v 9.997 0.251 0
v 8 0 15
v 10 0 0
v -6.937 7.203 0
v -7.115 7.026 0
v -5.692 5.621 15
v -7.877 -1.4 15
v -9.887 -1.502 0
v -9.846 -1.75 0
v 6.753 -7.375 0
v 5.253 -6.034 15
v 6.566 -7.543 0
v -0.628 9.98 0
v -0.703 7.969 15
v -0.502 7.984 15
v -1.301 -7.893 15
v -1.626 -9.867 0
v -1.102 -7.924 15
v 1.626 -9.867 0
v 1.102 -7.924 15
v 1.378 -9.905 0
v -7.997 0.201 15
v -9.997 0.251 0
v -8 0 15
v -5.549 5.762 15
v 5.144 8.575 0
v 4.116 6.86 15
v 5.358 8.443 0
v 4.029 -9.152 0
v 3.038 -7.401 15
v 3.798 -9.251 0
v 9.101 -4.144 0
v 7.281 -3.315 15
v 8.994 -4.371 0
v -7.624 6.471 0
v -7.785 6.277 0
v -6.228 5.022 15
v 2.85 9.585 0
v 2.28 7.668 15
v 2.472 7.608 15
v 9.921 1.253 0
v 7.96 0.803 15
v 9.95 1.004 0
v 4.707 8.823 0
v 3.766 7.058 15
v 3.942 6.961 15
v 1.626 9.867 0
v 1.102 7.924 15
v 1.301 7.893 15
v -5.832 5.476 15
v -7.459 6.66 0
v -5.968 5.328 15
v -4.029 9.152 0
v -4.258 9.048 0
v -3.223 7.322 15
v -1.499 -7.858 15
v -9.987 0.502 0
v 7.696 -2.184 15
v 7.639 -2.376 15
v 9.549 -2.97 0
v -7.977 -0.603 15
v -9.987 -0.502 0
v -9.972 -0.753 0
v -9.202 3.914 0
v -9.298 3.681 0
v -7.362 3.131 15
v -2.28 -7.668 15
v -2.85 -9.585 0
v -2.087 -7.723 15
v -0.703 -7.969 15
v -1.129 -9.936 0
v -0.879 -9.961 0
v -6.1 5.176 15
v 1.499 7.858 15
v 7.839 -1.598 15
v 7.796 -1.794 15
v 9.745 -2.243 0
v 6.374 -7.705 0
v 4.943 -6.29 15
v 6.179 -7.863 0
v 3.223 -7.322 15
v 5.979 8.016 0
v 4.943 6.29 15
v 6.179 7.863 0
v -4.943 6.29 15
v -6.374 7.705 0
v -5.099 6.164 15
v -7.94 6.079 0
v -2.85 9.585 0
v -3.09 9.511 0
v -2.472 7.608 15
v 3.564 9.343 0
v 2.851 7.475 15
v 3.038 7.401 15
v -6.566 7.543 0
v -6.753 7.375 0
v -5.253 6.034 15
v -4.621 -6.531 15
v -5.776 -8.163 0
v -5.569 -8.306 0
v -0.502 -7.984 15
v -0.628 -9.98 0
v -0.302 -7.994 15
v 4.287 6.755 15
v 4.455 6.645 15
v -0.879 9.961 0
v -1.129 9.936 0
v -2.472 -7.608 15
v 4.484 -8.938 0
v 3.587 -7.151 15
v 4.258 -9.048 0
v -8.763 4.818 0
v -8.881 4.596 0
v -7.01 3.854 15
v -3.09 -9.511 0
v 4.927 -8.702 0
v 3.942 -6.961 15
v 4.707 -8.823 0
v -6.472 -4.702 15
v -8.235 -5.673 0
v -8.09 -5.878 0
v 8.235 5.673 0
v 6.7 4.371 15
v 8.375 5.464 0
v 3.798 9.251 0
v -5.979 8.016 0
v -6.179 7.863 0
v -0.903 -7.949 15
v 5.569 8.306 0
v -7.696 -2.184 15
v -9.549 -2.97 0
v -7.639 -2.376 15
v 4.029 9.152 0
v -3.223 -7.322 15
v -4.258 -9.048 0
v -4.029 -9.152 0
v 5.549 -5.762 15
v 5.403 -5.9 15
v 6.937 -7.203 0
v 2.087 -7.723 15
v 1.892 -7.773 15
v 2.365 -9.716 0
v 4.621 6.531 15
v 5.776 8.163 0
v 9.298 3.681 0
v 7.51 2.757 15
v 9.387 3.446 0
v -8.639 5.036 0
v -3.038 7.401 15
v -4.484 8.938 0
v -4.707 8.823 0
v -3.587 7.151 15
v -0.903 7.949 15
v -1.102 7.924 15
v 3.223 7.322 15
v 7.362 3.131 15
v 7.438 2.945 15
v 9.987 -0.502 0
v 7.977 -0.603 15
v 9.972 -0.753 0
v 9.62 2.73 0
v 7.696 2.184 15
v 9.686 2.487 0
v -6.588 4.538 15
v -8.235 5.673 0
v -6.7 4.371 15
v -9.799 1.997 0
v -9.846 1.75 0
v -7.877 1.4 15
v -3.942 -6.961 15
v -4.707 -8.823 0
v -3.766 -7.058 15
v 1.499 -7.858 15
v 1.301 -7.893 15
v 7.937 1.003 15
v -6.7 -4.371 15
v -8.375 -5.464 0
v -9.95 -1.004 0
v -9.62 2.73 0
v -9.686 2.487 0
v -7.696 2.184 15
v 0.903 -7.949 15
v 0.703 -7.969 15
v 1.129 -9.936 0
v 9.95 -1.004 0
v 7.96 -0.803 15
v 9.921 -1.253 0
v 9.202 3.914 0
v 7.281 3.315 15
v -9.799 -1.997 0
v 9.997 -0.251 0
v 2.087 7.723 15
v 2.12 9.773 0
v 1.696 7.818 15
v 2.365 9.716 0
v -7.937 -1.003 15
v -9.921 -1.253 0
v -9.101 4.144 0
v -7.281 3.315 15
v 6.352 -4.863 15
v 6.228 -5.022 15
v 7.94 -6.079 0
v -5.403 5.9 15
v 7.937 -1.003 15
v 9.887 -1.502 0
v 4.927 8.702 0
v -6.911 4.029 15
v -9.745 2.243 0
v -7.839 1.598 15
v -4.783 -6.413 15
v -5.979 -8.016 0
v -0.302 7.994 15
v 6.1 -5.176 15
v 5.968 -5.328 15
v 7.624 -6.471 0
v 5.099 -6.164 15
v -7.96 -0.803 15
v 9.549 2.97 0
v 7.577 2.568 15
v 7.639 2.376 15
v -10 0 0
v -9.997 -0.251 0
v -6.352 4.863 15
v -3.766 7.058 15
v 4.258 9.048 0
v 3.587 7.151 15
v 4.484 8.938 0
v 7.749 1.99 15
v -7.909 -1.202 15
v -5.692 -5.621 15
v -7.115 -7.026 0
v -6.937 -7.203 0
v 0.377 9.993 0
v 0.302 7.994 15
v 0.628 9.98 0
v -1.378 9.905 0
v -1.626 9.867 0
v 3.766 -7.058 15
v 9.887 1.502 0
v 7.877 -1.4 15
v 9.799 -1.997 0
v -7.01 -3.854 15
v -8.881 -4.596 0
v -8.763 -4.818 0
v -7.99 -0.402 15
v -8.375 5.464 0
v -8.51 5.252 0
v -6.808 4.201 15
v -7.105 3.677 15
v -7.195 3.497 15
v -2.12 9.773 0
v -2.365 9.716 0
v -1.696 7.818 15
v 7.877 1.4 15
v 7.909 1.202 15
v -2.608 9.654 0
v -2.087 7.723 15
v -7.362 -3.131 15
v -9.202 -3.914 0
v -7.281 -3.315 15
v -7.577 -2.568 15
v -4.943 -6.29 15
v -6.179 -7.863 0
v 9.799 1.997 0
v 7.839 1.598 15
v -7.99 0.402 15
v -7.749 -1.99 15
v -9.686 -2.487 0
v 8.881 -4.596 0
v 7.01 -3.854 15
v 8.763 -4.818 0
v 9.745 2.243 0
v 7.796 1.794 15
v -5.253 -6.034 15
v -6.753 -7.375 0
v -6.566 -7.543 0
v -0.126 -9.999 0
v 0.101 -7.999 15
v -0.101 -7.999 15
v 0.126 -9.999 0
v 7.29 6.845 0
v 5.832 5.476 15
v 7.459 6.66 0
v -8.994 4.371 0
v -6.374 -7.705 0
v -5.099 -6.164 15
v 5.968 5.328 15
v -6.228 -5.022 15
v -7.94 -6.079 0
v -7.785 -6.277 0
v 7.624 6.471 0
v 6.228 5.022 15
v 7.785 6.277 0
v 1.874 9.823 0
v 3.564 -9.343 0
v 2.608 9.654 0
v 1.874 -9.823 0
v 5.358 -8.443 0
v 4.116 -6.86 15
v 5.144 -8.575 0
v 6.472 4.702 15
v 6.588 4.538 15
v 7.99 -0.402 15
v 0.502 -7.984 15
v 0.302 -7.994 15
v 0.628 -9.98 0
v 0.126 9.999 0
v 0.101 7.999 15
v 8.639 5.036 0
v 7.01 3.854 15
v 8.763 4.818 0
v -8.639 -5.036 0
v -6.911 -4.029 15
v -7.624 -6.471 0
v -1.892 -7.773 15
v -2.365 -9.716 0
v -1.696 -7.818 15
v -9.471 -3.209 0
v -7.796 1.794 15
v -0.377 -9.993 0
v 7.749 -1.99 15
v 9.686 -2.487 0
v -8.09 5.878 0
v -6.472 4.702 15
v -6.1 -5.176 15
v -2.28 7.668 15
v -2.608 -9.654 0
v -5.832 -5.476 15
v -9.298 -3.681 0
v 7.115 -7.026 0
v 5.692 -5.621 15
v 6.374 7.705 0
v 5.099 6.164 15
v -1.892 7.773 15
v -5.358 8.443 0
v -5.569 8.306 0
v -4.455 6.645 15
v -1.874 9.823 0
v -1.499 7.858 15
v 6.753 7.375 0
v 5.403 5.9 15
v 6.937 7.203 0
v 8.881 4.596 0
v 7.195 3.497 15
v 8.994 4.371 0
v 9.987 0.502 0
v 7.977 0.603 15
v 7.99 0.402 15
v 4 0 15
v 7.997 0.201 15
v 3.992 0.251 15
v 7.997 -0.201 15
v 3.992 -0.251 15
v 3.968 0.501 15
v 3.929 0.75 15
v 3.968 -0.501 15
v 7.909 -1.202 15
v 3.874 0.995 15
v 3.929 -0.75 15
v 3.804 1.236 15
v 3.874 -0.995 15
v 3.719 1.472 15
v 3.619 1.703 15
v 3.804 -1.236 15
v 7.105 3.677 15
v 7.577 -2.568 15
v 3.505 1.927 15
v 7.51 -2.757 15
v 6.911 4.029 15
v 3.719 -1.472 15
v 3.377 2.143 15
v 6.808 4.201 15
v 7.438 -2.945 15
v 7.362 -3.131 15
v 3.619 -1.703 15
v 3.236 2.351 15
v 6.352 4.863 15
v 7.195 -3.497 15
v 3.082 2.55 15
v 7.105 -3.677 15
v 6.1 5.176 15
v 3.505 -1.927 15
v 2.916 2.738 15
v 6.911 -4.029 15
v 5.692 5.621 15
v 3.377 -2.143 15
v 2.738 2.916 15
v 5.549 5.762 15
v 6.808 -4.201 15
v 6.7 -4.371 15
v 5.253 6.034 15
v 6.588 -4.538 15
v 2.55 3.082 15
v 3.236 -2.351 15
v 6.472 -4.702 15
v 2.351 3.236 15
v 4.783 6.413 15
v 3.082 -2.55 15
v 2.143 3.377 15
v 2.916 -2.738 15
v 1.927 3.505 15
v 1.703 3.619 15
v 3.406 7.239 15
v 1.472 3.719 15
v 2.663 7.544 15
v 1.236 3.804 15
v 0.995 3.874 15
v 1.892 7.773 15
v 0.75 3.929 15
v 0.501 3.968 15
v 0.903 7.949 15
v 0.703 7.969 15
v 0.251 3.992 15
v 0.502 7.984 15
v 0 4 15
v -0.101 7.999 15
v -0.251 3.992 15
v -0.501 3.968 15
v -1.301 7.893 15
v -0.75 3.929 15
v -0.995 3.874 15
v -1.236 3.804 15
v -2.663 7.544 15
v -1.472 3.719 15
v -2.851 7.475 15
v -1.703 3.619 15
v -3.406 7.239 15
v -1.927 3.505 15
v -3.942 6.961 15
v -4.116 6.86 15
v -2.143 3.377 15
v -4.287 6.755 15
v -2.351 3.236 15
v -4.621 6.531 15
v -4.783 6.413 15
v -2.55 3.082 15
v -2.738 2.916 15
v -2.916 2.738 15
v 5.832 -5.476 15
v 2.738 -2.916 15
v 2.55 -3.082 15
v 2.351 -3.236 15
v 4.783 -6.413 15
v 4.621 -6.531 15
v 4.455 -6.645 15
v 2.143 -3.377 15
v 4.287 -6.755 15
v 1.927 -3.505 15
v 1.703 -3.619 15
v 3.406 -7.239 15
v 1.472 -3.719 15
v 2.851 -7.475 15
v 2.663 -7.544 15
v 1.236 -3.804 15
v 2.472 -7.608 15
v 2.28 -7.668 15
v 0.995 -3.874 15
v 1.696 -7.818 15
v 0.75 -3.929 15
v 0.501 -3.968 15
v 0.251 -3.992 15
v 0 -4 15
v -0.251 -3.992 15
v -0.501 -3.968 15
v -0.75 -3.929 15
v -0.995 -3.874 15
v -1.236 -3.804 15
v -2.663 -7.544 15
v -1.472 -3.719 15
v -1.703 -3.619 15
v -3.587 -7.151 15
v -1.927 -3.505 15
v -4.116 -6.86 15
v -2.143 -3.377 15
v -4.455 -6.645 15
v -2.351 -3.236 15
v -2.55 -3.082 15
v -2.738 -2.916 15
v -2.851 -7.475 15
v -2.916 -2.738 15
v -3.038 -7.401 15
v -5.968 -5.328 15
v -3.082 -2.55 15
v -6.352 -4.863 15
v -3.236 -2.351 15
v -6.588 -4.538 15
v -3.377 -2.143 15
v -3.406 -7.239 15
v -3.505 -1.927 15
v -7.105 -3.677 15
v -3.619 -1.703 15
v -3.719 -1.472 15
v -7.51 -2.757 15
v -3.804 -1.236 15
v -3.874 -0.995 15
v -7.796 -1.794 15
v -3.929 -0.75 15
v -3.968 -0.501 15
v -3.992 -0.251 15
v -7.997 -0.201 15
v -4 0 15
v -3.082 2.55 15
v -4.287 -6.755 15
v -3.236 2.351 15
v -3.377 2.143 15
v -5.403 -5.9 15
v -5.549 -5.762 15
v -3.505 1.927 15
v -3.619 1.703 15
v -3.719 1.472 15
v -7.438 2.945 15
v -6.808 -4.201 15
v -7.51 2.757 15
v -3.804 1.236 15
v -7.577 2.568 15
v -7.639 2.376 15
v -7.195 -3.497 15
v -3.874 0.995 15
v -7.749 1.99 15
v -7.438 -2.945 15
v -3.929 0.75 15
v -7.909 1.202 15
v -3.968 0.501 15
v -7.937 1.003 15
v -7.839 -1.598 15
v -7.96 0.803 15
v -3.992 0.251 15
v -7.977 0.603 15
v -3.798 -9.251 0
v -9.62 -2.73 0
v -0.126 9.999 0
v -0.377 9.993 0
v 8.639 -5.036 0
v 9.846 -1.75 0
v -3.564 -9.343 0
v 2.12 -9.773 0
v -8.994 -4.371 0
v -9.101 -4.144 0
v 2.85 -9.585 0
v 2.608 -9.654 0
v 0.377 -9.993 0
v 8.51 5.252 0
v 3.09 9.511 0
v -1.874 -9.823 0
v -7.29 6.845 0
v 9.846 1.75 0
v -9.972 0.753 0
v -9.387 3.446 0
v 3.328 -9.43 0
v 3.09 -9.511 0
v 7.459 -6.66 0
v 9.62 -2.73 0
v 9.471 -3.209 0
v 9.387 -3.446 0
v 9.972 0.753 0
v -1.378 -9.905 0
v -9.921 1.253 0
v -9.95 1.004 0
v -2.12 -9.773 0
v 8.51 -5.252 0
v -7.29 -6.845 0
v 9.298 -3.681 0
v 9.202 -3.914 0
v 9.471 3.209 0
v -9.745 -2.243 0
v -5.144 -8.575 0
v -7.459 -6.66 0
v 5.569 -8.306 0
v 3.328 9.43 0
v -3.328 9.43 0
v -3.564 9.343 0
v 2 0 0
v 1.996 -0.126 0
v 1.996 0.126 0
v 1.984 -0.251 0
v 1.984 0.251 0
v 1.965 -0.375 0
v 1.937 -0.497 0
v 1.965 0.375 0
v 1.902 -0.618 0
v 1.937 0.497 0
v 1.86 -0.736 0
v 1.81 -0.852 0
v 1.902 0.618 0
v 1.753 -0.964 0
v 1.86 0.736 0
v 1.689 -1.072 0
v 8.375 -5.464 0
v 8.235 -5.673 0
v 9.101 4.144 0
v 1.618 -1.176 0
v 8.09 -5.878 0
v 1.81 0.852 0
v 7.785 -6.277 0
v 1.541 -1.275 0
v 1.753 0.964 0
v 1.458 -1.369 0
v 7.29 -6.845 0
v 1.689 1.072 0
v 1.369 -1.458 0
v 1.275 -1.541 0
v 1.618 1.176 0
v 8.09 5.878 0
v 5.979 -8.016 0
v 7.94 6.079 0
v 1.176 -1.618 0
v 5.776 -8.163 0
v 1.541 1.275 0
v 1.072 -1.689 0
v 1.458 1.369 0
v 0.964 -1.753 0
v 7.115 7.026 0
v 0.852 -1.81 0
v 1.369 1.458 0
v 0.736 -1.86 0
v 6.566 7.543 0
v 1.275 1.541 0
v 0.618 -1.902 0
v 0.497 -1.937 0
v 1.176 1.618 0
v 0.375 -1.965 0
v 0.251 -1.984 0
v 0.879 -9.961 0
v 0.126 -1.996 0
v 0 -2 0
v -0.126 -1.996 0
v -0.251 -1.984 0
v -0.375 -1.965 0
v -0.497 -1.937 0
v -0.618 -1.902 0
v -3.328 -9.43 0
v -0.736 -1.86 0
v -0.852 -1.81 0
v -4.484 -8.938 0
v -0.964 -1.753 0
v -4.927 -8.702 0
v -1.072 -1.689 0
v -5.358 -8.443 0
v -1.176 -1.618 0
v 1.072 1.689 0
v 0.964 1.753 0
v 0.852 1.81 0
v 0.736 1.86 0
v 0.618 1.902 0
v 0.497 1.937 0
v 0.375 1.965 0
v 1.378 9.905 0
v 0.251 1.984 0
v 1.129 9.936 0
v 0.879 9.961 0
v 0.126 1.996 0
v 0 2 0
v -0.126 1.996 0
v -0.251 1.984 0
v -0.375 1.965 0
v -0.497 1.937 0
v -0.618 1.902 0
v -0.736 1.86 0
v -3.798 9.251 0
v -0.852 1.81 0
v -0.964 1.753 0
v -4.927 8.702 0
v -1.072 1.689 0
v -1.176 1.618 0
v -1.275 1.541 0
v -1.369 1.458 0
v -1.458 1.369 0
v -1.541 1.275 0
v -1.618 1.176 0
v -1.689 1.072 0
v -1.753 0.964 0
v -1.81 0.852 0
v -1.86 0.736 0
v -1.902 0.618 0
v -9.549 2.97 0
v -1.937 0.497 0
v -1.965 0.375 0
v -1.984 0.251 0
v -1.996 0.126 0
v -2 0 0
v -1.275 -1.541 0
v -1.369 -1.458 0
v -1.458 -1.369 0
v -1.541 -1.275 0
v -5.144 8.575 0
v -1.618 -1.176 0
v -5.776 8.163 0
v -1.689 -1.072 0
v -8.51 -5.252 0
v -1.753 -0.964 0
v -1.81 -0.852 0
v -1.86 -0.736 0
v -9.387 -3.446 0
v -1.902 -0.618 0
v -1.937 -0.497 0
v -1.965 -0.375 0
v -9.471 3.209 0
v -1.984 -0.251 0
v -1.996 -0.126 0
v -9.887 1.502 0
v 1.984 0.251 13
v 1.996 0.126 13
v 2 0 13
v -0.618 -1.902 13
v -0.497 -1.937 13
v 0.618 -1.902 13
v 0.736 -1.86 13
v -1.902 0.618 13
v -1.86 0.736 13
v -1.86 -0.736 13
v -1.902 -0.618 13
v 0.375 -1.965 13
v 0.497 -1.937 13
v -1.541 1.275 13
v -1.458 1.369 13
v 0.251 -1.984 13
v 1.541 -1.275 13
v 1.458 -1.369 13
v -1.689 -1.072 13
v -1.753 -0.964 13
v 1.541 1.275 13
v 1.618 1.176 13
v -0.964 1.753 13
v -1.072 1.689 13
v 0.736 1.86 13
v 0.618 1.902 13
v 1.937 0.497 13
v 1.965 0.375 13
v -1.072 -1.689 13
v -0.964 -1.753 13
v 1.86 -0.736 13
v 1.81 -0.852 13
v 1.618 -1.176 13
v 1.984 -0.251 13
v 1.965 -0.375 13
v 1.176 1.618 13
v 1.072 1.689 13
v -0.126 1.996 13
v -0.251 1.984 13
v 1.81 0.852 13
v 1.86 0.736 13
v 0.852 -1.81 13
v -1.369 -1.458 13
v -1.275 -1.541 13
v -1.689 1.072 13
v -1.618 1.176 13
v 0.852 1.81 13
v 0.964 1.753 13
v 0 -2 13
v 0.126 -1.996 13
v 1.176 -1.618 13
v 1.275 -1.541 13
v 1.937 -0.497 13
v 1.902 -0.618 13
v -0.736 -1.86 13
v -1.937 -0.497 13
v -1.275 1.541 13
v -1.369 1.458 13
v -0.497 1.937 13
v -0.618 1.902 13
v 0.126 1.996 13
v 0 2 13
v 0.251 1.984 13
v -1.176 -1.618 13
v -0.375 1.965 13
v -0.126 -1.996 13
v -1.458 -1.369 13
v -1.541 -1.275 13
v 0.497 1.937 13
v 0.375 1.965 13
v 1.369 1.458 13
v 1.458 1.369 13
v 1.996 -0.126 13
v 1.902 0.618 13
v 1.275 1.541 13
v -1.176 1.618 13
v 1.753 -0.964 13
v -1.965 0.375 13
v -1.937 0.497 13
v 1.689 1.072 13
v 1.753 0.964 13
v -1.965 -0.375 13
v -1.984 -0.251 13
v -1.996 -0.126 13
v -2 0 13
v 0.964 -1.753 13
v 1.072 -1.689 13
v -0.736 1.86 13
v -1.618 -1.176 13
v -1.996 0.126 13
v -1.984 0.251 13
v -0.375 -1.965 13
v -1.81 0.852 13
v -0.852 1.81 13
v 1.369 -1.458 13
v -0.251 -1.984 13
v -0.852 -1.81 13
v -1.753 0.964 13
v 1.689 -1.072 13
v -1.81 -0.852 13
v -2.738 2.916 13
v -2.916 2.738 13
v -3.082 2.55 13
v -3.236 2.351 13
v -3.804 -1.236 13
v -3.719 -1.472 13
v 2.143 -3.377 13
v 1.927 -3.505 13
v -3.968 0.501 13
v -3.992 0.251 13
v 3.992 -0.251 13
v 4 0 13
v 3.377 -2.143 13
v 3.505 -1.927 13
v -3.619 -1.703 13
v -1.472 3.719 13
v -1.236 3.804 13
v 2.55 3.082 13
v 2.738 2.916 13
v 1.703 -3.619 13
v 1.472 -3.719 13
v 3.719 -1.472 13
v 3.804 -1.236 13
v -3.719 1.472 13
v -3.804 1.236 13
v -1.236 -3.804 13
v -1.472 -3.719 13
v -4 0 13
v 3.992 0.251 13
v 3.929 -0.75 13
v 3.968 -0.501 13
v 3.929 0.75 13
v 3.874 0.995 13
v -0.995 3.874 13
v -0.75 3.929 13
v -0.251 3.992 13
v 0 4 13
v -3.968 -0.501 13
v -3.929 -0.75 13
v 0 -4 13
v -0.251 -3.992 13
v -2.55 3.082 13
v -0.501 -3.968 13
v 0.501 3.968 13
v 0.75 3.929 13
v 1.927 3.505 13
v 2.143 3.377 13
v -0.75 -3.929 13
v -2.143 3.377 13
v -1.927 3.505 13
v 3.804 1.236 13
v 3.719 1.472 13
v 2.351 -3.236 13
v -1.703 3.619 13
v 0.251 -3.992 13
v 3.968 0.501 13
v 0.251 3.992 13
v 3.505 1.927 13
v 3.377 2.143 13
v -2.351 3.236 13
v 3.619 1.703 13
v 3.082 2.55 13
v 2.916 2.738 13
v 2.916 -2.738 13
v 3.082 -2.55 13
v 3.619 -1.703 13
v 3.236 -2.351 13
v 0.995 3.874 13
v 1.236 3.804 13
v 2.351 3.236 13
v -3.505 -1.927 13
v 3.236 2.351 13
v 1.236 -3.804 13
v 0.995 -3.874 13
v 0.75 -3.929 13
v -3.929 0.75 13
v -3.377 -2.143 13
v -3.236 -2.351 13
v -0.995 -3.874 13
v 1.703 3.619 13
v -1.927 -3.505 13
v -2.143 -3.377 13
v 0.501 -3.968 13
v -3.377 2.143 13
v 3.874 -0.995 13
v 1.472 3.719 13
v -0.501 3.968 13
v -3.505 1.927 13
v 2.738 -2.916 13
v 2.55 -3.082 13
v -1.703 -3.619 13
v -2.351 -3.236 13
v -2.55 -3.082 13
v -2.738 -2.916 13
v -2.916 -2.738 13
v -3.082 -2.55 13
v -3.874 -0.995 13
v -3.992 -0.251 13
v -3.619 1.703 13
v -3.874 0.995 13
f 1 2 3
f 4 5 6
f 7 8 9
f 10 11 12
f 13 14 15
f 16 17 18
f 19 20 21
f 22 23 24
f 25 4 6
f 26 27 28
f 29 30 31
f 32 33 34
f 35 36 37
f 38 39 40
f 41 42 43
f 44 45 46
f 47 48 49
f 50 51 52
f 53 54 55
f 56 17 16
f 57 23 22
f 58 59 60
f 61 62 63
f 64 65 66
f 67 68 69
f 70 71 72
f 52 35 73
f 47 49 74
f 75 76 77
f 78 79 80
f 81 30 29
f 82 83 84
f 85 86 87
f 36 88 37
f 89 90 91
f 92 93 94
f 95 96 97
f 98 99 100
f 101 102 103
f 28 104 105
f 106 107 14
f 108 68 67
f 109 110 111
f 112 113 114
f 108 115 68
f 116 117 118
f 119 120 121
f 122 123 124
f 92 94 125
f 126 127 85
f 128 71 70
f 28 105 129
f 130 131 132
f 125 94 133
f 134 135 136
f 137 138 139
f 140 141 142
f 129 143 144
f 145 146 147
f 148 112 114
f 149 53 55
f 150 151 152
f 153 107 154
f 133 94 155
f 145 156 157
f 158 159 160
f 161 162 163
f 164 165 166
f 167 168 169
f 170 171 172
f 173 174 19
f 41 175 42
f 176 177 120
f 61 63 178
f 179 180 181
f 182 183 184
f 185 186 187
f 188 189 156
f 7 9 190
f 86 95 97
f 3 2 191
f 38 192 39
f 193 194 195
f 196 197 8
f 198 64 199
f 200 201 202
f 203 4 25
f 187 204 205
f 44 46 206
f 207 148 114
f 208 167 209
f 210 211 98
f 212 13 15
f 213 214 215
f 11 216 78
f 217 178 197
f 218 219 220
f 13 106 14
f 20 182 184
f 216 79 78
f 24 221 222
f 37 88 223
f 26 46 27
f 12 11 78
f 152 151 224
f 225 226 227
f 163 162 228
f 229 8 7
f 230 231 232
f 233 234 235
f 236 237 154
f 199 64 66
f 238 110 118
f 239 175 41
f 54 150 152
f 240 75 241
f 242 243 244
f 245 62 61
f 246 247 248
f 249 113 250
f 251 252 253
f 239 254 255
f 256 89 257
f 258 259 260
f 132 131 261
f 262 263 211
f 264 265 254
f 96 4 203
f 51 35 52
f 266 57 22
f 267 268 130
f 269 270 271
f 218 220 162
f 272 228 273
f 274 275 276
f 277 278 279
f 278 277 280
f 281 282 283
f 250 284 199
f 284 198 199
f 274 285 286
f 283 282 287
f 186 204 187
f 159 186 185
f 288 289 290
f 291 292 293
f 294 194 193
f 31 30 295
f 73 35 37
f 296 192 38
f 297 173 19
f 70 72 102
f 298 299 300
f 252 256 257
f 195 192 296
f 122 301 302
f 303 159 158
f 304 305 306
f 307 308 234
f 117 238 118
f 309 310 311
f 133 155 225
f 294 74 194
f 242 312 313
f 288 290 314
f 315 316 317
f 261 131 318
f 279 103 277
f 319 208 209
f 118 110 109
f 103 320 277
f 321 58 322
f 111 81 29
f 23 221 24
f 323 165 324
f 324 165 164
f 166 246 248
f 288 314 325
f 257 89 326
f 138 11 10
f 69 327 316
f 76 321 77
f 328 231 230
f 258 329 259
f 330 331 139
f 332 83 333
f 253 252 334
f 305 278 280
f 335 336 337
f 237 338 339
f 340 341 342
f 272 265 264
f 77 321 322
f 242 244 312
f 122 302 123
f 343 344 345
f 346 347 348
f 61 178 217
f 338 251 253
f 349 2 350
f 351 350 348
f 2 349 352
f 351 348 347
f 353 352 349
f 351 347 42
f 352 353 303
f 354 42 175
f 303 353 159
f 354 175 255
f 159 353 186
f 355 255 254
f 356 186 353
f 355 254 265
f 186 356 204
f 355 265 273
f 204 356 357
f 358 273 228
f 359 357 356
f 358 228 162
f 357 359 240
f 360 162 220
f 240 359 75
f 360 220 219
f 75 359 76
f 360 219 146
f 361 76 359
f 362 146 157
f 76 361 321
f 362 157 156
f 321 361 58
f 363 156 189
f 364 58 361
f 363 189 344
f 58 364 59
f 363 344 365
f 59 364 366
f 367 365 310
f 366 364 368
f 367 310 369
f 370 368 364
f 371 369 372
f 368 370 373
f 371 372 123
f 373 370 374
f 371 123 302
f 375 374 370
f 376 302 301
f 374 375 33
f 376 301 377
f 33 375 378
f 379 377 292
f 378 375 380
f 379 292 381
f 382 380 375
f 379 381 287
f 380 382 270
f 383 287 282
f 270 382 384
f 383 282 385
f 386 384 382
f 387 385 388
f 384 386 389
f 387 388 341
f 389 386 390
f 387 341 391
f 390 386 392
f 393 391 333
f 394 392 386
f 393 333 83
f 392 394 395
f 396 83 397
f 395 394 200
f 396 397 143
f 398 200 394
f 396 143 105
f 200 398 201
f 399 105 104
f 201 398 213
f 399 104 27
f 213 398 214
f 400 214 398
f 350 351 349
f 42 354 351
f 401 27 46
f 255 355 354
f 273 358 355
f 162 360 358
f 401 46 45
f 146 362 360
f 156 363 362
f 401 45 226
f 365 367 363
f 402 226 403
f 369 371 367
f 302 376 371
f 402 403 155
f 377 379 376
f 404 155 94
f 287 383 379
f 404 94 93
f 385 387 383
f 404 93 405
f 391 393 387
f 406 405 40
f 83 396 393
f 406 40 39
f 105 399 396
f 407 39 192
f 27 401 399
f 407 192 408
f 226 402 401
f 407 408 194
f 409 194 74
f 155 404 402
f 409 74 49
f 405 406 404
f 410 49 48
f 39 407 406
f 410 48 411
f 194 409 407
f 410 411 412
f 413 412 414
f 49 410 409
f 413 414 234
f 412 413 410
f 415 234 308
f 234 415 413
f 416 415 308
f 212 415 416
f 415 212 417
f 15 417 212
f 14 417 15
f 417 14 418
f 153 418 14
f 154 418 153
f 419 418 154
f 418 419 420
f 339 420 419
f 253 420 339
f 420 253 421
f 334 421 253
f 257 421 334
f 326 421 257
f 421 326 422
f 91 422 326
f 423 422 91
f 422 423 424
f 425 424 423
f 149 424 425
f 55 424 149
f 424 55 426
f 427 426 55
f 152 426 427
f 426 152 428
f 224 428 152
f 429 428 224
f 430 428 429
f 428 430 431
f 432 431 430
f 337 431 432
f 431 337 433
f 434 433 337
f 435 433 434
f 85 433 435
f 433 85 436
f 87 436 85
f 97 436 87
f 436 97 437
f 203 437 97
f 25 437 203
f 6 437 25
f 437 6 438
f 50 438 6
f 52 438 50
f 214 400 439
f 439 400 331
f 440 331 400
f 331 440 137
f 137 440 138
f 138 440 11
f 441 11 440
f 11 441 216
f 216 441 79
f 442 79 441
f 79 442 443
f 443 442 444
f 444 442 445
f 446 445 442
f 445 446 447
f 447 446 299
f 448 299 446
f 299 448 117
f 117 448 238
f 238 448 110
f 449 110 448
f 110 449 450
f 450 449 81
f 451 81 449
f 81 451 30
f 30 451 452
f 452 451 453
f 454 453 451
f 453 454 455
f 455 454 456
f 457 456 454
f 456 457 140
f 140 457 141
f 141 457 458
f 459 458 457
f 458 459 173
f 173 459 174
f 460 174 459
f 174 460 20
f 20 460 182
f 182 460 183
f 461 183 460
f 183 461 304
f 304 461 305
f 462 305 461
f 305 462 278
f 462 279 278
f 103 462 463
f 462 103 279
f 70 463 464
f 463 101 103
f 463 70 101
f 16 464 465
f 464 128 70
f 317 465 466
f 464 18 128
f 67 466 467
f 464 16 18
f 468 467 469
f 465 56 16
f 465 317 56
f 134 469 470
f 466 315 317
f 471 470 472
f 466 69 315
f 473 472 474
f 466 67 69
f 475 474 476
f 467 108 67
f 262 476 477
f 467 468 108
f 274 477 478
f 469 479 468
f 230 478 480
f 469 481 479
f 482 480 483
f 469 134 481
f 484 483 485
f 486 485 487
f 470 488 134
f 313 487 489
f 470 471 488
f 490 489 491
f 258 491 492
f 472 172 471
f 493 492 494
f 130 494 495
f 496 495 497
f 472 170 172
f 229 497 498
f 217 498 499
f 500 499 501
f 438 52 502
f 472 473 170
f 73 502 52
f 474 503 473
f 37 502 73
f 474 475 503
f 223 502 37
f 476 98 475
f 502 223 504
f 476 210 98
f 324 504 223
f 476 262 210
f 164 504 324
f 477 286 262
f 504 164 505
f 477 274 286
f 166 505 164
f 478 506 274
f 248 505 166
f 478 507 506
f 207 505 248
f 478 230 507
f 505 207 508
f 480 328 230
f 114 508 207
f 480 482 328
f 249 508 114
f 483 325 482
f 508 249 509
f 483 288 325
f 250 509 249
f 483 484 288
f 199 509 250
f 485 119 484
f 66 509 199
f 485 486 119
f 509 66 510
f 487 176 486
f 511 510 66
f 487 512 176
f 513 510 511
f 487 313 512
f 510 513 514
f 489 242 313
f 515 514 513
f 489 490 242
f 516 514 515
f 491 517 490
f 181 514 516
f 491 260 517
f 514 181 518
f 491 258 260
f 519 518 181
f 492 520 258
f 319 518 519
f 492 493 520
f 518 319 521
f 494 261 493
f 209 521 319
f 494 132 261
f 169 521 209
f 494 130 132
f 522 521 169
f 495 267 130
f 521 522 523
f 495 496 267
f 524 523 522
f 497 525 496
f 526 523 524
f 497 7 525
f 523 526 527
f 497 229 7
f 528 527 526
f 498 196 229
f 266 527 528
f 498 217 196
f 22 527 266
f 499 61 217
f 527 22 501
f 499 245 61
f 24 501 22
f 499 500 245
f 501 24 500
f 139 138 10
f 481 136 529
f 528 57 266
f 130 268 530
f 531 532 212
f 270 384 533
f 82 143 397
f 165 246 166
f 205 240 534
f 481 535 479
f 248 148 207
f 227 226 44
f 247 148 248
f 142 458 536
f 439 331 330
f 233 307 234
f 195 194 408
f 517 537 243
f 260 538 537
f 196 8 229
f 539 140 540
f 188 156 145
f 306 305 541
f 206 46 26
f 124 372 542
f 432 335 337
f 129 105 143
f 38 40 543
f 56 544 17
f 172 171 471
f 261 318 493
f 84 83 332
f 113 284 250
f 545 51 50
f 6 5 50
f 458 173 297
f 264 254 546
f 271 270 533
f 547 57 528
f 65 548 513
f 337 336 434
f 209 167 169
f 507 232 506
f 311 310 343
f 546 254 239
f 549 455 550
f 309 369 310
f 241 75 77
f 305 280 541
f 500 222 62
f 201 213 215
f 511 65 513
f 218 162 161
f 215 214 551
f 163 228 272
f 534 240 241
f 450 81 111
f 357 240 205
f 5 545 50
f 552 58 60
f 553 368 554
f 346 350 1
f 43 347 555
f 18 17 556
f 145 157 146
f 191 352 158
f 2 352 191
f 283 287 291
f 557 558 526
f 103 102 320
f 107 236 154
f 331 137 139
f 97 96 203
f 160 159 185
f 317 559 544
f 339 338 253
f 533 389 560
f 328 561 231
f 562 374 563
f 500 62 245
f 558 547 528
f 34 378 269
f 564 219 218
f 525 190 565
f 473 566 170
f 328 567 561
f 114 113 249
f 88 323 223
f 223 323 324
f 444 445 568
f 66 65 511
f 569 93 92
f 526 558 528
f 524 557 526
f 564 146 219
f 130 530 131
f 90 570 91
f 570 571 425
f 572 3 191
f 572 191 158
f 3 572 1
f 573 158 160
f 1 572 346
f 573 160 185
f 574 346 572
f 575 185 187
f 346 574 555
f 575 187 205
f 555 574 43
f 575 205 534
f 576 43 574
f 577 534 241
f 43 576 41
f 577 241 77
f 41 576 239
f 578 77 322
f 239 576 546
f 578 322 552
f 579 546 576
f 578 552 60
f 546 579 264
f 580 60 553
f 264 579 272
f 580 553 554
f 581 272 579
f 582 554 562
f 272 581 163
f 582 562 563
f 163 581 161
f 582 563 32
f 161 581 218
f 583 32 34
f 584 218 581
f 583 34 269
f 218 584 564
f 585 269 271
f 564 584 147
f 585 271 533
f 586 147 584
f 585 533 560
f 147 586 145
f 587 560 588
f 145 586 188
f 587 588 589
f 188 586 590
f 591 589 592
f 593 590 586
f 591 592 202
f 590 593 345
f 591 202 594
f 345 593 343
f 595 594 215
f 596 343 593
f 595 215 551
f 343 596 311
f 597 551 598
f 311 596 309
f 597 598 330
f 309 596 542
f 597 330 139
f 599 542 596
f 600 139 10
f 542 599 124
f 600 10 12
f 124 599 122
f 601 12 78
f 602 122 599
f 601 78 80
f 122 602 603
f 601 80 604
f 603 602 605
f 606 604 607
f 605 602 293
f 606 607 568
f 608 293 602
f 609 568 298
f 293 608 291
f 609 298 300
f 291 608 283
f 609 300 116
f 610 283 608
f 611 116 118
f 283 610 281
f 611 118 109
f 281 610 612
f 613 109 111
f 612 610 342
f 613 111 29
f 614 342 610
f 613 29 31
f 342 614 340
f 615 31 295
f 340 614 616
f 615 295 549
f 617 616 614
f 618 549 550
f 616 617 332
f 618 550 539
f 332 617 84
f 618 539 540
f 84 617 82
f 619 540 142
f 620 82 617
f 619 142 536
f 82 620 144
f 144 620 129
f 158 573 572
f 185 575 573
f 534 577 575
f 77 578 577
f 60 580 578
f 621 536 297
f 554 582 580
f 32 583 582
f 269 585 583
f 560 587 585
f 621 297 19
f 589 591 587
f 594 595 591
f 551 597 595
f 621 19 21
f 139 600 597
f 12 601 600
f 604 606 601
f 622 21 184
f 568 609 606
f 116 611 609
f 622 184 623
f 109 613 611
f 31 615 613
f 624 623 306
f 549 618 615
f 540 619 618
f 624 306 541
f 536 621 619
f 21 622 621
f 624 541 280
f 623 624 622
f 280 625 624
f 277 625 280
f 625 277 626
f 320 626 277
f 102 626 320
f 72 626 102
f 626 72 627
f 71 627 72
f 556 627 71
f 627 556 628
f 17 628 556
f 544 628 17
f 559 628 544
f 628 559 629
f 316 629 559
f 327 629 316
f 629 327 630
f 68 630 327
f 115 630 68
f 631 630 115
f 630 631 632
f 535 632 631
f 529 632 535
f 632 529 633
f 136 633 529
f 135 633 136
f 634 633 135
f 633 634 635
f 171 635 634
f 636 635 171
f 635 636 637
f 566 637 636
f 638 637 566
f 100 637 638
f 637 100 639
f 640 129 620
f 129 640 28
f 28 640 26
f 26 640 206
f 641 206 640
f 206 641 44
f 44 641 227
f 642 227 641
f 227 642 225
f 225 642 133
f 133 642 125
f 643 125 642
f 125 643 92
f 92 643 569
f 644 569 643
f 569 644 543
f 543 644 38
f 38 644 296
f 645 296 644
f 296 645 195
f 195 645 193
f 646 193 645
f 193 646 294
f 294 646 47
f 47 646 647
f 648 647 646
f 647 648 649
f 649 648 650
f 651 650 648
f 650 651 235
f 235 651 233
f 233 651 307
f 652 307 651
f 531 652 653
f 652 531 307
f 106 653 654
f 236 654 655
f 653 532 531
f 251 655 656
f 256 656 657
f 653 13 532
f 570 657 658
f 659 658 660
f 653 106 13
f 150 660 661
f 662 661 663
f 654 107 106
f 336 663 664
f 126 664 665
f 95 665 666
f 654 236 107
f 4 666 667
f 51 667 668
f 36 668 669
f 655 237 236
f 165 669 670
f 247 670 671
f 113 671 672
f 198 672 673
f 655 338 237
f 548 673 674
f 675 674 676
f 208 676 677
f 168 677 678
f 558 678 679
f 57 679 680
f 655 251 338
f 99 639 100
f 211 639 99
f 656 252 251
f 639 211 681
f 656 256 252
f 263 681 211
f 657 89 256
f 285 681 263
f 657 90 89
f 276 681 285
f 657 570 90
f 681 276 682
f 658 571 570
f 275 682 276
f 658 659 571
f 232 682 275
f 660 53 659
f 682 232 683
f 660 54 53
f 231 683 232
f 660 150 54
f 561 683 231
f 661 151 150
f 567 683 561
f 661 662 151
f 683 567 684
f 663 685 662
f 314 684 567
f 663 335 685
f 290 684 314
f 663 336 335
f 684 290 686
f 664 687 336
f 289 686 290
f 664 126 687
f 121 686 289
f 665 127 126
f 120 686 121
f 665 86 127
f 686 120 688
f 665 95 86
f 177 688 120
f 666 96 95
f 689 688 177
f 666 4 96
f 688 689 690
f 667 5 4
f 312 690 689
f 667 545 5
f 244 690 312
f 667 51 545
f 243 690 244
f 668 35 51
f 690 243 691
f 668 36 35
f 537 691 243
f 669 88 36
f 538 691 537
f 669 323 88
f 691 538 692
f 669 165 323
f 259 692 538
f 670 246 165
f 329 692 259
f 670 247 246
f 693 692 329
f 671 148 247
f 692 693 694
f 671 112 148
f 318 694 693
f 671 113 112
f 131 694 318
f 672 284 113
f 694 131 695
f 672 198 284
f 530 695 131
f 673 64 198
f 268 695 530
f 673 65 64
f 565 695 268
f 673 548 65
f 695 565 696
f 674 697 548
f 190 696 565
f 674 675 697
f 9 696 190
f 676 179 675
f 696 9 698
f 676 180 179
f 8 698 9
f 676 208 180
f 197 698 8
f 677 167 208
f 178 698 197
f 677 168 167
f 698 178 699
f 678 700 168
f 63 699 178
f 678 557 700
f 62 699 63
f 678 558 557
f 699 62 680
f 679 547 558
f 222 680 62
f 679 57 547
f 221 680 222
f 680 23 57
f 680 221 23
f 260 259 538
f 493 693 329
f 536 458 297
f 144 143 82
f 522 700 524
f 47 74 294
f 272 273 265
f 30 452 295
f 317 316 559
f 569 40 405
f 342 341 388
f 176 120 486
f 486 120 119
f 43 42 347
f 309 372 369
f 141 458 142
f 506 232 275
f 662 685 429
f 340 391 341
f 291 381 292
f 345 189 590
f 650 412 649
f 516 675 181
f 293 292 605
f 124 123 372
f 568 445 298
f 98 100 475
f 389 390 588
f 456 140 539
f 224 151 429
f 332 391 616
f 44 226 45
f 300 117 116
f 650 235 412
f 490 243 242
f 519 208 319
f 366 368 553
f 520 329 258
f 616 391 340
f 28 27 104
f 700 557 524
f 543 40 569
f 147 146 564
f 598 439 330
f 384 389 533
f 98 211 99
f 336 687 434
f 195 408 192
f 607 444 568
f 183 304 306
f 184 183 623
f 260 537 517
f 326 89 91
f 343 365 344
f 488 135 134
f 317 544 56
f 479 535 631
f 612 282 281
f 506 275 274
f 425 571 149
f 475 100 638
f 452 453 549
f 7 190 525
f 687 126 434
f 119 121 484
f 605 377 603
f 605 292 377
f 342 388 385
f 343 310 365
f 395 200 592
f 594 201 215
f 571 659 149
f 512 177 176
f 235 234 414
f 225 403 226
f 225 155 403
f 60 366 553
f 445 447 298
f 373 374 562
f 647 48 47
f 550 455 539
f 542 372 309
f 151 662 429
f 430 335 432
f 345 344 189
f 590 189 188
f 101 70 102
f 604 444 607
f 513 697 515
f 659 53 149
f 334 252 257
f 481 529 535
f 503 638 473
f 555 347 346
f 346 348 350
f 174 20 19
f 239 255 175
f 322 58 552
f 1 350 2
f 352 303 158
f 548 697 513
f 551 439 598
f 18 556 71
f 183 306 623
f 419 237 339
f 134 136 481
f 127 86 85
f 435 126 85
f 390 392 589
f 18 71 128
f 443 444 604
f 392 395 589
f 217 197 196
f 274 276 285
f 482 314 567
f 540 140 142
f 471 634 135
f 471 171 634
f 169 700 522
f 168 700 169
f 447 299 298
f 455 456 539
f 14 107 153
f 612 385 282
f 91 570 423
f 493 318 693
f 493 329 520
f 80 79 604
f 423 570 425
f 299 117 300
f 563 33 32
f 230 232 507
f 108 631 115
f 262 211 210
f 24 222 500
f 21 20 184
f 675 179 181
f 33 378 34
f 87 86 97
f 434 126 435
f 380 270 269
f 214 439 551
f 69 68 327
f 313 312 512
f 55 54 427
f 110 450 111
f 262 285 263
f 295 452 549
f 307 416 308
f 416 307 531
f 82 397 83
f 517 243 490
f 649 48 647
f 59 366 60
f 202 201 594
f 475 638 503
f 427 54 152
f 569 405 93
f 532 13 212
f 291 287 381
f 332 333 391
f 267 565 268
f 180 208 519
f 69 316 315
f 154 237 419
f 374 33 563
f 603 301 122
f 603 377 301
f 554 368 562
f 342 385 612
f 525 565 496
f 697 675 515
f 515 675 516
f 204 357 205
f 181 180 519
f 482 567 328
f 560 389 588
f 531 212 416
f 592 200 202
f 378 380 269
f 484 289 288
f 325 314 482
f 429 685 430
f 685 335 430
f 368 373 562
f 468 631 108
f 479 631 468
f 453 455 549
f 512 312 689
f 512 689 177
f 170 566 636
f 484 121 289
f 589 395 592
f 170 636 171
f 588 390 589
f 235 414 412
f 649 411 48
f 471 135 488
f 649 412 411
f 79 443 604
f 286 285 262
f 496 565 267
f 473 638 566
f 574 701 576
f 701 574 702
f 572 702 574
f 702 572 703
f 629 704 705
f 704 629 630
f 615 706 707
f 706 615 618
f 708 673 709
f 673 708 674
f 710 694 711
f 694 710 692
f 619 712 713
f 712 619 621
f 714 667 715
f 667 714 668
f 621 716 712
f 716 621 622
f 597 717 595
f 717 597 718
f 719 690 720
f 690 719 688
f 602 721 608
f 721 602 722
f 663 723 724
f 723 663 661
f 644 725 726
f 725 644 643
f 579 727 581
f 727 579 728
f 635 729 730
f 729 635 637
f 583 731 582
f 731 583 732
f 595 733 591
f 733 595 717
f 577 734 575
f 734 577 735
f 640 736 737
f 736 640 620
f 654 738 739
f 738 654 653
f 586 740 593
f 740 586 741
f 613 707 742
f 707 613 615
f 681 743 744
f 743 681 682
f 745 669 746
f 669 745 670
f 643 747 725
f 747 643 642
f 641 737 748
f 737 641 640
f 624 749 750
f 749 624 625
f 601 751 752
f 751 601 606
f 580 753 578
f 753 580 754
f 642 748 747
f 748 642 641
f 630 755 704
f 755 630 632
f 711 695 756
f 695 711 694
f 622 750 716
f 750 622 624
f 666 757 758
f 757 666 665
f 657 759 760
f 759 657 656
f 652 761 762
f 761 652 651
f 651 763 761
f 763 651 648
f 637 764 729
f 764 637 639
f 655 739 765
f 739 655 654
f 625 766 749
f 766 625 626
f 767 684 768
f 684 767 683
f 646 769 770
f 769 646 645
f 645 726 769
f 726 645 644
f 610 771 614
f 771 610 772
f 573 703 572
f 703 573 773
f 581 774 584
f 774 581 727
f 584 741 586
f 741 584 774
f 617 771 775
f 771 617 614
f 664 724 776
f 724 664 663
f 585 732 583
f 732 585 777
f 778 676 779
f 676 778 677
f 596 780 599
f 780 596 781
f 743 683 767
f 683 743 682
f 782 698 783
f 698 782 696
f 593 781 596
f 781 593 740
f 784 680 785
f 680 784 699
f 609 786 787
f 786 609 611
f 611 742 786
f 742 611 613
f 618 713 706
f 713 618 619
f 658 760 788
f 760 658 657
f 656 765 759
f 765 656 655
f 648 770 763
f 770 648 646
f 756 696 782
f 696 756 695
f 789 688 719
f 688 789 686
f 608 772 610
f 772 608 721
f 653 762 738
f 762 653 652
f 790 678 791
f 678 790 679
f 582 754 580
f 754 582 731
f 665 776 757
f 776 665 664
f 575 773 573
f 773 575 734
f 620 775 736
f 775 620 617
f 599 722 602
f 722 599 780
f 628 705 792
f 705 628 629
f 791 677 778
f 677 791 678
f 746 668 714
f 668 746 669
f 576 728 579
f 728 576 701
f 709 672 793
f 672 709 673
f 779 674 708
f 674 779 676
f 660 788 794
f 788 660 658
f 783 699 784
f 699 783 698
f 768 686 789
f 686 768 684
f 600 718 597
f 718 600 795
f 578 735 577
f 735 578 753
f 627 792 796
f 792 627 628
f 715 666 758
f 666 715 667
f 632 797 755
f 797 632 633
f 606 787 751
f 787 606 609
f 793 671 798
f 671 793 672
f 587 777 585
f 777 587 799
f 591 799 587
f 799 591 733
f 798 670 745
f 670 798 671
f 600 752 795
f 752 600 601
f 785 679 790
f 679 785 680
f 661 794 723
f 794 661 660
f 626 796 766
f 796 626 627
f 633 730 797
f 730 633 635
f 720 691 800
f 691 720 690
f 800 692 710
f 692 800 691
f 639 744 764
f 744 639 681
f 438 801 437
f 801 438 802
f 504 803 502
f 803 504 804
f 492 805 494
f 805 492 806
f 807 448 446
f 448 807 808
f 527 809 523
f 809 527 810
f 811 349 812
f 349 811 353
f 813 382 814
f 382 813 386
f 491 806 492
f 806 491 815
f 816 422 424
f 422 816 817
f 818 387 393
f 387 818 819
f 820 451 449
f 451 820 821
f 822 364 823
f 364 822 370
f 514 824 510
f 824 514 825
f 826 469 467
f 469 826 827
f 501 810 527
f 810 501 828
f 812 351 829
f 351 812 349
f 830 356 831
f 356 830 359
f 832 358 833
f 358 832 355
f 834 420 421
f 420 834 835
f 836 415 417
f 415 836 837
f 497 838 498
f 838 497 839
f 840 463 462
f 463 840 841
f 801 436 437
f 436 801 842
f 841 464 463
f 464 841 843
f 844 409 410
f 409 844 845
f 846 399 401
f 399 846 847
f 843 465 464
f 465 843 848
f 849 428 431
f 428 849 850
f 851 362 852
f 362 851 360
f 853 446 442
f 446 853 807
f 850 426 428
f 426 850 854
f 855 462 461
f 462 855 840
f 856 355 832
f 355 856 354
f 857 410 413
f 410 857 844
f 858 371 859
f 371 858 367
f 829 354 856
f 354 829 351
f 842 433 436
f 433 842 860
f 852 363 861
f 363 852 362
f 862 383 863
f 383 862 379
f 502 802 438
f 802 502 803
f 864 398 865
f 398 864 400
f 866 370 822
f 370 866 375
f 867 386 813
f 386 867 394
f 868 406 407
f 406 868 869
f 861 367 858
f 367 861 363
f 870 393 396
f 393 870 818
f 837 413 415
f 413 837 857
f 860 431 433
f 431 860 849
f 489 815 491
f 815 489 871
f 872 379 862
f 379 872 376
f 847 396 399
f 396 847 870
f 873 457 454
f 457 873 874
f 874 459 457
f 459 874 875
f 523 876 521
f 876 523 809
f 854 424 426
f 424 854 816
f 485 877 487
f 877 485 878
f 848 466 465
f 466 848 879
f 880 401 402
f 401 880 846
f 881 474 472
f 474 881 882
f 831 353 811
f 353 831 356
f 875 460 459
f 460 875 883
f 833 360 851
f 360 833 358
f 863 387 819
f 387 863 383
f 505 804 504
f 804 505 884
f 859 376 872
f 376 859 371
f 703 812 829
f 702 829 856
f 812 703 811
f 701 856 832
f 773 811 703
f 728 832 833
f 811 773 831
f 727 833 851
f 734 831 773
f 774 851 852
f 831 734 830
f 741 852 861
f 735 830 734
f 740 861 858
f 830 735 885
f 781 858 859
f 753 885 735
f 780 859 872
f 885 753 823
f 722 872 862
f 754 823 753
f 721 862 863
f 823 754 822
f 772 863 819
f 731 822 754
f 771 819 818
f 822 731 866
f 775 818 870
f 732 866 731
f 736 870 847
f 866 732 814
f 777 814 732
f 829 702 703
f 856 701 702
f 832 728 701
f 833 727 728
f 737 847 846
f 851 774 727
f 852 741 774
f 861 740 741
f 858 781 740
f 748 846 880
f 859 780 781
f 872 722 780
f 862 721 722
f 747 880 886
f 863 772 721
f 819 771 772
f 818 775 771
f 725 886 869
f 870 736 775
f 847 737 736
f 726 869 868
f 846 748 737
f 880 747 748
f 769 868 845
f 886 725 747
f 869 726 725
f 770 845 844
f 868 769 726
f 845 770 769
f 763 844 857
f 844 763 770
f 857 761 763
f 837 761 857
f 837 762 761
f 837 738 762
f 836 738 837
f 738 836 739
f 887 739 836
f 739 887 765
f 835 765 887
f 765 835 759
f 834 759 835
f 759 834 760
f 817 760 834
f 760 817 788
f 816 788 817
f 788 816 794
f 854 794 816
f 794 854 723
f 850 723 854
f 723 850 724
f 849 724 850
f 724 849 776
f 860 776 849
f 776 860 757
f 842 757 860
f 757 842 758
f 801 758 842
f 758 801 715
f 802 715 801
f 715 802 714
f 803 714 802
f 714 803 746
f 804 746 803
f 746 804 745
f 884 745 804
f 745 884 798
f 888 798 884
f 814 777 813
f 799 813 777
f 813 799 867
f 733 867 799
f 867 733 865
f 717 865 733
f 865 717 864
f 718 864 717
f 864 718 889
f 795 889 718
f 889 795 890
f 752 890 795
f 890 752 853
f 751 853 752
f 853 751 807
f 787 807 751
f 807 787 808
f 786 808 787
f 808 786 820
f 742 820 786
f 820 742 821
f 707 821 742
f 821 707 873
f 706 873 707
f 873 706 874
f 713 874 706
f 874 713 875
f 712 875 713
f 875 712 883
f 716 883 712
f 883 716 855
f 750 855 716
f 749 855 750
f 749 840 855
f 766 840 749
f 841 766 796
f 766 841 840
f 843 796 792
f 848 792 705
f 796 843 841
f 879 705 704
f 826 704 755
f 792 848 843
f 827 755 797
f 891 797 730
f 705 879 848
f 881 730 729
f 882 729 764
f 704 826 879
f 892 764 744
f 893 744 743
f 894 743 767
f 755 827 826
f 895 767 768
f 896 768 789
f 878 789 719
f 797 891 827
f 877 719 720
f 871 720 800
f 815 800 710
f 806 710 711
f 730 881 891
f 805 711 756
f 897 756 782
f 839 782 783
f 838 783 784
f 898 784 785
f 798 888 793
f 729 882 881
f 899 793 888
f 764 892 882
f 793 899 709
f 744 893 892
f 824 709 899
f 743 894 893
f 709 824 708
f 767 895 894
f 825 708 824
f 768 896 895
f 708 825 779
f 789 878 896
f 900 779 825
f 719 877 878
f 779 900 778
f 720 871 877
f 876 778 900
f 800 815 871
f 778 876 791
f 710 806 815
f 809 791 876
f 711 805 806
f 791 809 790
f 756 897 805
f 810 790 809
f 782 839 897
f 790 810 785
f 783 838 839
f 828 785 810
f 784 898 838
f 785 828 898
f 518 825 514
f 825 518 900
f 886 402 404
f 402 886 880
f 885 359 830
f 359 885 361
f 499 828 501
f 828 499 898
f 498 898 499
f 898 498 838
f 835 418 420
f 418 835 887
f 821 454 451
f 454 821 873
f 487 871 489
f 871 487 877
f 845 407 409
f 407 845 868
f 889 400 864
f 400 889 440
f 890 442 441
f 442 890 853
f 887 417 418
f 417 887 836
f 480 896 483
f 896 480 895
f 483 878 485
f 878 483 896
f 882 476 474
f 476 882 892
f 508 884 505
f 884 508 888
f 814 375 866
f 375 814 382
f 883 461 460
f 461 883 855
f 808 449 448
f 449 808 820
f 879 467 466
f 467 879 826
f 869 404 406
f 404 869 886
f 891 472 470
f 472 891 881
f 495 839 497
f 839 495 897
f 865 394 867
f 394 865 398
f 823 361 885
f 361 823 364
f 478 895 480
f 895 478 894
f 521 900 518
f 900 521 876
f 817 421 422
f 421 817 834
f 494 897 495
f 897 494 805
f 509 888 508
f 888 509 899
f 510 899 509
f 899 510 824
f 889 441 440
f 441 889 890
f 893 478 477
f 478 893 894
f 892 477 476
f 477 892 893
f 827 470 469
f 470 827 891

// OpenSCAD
//Heigth of the Foot
FootHeigth = 15; //[5:50]

//Top foot size
TopWith = 10; //[5:30]

//Bottom foot size
BottomWith = 8; //[5:30]

//Hole diameter
HoleDiameter = 2; //[0.5:5]

//Size of the screw / nail
HeadHigth = 2; //[1:10]

//Size of the screw / nail Head
HeadWith = 4; //[2:10]


module FurnitureFoot()
{
	difference()
	{
		cylinder(r1=TopWith, r2=BottomWith, h=FootHeigth, $fn=250);
		translate([0,0,-1])cylinder(r=HoleDiameter, h=(FootHeigth+2),$fn=100);
		translate([0,0,FootHeigth-HeadHigth])cylinder(r=HeadWith, h=HeadHigth+1,$fn=100);
	}
}

FurnitureFoot();
